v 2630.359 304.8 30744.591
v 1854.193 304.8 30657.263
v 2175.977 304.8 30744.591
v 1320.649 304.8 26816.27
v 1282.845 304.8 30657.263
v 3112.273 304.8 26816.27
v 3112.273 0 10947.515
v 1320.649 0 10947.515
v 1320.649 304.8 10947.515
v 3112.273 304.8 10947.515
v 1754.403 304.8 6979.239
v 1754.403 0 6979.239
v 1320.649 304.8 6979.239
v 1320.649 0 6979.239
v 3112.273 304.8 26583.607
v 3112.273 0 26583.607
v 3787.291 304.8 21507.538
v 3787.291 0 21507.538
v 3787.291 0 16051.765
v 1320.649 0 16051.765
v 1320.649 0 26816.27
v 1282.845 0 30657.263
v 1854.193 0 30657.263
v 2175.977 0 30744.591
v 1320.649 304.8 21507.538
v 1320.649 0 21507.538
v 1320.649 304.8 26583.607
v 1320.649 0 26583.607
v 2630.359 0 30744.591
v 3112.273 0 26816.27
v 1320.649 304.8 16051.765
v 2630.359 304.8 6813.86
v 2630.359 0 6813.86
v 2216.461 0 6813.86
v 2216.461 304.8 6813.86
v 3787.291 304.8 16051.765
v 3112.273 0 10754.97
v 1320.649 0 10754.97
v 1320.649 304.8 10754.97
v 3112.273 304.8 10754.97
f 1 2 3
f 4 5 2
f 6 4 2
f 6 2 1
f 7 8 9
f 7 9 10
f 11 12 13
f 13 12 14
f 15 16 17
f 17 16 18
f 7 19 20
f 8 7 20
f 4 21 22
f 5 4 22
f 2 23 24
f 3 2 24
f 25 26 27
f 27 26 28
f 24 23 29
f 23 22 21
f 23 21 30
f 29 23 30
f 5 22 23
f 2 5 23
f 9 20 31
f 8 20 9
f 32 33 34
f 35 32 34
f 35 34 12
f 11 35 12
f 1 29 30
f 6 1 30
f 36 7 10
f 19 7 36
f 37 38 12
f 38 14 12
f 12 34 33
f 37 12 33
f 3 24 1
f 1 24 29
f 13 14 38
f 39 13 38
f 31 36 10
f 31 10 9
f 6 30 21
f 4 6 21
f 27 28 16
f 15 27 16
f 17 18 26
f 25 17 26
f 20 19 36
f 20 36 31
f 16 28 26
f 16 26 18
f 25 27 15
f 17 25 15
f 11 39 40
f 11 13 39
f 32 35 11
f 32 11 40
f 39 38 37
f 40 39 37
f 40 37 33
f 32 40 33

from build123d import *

# Parameters (mm, degrees)
BOSS_EXTRUDE1_DEPTH   = 304.8
BOSS_EXTRUDE1_2_DEPTH = 304.8
BOSS_EXTRUDE1_3_DEPTH = 304.8
BOSS_EXTRUDE1_4_DEPTH = 304.8
SCALE5_SCALE_X        = 0.7
SCALE5_SCALE_Y        = 1
SCALE5_SCALE_Z        = 1


with BuildPart() as part:
    # Sketch1 → Boss-Extrude1 (new body)
    with BuildSketch(Plane(origin=(0, 0, 0), x_dir=(1, 0, 0), z_dir=(0, 1, 0))):
        Polygon((1886.641629334, -10754.970396294), (4446.103774355, -10754.970396294), (3757.655234393, -6813.860152516), (3166.372701844, -6813.860152516), (2506.28949209, -6979.238884979), (1886.641629334, -6979.238884979), align=None)
    extrude(amount=BOSS_EXTRUDE1_DEPTH)


with BuildPart() as body_2:
    # Sketch1 → Boss-Extrude1 2 (new body)
    with BuildSketch(Plane(origin=(0, 0, 0), x_dir=(1, 0, 0), z_dir=(0, 1, 0))):
        Polygon((1886.641629334, -10947.515495193), (4446.103774355, -10947.515495193), (5410.415640064, -16051.764693931), (1886.641629334, -16051.764693931), align=None)
    extrude(amount=BOSS_EXTRUDE1_2_DEPTH)


with BuildPart() as body_3:
    # Sketch1 → Boss-Extrude1 3 (new body)
    with BuildSketch(Plane(origin=(0, 0, 0), x_dir=(1, 0, 0), z_dir=(0, 1, 0))):
        Polygon((1886.641629334, -21507.538468933), (1886.641629334, -26583.606940771), (2301.35615775, -26583.606940771), (4446.103774355, -26583.606940771), (5410.415640064, -21507.538468933), align=None)
    extrude(amount=BOSS_EXTRUDE1_3_DEPTH)


with BuildPart() as body_4:
    # Sketch1 → Boss-Extrude1 4 (new body)
    with BuildSketch(Plane(origin=(0, 0, 0), x_dir=(1, 0, 0), z_dir=(0, 1, 0))):
        Polygon((1886.641629334, -26816.270093761), (1832.636119861, -30657.262573668), (2648.847021842, -30657.262573668), (3108.538310626, -30744.591136472), (3757.655234393, -30744.591136472), (4446.103774355, -26816.270093761), align=None)
    extrude(amount=BOSS_EXTRUDE1_4_DEPTH)


with BuildPart() as body_3_1:
    # Scale5: scaled about (0, 0, 0)
    add(body_3.part.scale((SCALE5_SCALE_X, SCALE5_SCALE_Y, SCALE5_SCALE_Z), about=(0, 0, 0)))


with BuildPart() as body_4_1:
    # Scale5: scaled about (0, 0, 0)
    add(body_4.part.scale((SCALE5_SCALE_X, SCALE5_SCALE_Y, SCALE5_SCALE_Z), about=(0, 0, 0)))


with BuildPart() as part_1:
    # Scale5: scaled about (0, 0, 0)
    add(part.part.scale((SCALE5_SCALE_X, SCALE5_SCALE_Y, SCALE5_SCALE_Z), about=(0, 0, 0)))


with BuildPart() as body_2_1:
    # Scale5: scaled about (0, 0, 0)
    add(body_2.part.scale((SCALE5_SCALE_X, SCALE5_SCALE_Y, SCALE5_SCALE_Z), about=(0, 0, 0)))


solid = Compound([body_3_1.part, body_4_1.part, part_1.part, body_2_1.part])
